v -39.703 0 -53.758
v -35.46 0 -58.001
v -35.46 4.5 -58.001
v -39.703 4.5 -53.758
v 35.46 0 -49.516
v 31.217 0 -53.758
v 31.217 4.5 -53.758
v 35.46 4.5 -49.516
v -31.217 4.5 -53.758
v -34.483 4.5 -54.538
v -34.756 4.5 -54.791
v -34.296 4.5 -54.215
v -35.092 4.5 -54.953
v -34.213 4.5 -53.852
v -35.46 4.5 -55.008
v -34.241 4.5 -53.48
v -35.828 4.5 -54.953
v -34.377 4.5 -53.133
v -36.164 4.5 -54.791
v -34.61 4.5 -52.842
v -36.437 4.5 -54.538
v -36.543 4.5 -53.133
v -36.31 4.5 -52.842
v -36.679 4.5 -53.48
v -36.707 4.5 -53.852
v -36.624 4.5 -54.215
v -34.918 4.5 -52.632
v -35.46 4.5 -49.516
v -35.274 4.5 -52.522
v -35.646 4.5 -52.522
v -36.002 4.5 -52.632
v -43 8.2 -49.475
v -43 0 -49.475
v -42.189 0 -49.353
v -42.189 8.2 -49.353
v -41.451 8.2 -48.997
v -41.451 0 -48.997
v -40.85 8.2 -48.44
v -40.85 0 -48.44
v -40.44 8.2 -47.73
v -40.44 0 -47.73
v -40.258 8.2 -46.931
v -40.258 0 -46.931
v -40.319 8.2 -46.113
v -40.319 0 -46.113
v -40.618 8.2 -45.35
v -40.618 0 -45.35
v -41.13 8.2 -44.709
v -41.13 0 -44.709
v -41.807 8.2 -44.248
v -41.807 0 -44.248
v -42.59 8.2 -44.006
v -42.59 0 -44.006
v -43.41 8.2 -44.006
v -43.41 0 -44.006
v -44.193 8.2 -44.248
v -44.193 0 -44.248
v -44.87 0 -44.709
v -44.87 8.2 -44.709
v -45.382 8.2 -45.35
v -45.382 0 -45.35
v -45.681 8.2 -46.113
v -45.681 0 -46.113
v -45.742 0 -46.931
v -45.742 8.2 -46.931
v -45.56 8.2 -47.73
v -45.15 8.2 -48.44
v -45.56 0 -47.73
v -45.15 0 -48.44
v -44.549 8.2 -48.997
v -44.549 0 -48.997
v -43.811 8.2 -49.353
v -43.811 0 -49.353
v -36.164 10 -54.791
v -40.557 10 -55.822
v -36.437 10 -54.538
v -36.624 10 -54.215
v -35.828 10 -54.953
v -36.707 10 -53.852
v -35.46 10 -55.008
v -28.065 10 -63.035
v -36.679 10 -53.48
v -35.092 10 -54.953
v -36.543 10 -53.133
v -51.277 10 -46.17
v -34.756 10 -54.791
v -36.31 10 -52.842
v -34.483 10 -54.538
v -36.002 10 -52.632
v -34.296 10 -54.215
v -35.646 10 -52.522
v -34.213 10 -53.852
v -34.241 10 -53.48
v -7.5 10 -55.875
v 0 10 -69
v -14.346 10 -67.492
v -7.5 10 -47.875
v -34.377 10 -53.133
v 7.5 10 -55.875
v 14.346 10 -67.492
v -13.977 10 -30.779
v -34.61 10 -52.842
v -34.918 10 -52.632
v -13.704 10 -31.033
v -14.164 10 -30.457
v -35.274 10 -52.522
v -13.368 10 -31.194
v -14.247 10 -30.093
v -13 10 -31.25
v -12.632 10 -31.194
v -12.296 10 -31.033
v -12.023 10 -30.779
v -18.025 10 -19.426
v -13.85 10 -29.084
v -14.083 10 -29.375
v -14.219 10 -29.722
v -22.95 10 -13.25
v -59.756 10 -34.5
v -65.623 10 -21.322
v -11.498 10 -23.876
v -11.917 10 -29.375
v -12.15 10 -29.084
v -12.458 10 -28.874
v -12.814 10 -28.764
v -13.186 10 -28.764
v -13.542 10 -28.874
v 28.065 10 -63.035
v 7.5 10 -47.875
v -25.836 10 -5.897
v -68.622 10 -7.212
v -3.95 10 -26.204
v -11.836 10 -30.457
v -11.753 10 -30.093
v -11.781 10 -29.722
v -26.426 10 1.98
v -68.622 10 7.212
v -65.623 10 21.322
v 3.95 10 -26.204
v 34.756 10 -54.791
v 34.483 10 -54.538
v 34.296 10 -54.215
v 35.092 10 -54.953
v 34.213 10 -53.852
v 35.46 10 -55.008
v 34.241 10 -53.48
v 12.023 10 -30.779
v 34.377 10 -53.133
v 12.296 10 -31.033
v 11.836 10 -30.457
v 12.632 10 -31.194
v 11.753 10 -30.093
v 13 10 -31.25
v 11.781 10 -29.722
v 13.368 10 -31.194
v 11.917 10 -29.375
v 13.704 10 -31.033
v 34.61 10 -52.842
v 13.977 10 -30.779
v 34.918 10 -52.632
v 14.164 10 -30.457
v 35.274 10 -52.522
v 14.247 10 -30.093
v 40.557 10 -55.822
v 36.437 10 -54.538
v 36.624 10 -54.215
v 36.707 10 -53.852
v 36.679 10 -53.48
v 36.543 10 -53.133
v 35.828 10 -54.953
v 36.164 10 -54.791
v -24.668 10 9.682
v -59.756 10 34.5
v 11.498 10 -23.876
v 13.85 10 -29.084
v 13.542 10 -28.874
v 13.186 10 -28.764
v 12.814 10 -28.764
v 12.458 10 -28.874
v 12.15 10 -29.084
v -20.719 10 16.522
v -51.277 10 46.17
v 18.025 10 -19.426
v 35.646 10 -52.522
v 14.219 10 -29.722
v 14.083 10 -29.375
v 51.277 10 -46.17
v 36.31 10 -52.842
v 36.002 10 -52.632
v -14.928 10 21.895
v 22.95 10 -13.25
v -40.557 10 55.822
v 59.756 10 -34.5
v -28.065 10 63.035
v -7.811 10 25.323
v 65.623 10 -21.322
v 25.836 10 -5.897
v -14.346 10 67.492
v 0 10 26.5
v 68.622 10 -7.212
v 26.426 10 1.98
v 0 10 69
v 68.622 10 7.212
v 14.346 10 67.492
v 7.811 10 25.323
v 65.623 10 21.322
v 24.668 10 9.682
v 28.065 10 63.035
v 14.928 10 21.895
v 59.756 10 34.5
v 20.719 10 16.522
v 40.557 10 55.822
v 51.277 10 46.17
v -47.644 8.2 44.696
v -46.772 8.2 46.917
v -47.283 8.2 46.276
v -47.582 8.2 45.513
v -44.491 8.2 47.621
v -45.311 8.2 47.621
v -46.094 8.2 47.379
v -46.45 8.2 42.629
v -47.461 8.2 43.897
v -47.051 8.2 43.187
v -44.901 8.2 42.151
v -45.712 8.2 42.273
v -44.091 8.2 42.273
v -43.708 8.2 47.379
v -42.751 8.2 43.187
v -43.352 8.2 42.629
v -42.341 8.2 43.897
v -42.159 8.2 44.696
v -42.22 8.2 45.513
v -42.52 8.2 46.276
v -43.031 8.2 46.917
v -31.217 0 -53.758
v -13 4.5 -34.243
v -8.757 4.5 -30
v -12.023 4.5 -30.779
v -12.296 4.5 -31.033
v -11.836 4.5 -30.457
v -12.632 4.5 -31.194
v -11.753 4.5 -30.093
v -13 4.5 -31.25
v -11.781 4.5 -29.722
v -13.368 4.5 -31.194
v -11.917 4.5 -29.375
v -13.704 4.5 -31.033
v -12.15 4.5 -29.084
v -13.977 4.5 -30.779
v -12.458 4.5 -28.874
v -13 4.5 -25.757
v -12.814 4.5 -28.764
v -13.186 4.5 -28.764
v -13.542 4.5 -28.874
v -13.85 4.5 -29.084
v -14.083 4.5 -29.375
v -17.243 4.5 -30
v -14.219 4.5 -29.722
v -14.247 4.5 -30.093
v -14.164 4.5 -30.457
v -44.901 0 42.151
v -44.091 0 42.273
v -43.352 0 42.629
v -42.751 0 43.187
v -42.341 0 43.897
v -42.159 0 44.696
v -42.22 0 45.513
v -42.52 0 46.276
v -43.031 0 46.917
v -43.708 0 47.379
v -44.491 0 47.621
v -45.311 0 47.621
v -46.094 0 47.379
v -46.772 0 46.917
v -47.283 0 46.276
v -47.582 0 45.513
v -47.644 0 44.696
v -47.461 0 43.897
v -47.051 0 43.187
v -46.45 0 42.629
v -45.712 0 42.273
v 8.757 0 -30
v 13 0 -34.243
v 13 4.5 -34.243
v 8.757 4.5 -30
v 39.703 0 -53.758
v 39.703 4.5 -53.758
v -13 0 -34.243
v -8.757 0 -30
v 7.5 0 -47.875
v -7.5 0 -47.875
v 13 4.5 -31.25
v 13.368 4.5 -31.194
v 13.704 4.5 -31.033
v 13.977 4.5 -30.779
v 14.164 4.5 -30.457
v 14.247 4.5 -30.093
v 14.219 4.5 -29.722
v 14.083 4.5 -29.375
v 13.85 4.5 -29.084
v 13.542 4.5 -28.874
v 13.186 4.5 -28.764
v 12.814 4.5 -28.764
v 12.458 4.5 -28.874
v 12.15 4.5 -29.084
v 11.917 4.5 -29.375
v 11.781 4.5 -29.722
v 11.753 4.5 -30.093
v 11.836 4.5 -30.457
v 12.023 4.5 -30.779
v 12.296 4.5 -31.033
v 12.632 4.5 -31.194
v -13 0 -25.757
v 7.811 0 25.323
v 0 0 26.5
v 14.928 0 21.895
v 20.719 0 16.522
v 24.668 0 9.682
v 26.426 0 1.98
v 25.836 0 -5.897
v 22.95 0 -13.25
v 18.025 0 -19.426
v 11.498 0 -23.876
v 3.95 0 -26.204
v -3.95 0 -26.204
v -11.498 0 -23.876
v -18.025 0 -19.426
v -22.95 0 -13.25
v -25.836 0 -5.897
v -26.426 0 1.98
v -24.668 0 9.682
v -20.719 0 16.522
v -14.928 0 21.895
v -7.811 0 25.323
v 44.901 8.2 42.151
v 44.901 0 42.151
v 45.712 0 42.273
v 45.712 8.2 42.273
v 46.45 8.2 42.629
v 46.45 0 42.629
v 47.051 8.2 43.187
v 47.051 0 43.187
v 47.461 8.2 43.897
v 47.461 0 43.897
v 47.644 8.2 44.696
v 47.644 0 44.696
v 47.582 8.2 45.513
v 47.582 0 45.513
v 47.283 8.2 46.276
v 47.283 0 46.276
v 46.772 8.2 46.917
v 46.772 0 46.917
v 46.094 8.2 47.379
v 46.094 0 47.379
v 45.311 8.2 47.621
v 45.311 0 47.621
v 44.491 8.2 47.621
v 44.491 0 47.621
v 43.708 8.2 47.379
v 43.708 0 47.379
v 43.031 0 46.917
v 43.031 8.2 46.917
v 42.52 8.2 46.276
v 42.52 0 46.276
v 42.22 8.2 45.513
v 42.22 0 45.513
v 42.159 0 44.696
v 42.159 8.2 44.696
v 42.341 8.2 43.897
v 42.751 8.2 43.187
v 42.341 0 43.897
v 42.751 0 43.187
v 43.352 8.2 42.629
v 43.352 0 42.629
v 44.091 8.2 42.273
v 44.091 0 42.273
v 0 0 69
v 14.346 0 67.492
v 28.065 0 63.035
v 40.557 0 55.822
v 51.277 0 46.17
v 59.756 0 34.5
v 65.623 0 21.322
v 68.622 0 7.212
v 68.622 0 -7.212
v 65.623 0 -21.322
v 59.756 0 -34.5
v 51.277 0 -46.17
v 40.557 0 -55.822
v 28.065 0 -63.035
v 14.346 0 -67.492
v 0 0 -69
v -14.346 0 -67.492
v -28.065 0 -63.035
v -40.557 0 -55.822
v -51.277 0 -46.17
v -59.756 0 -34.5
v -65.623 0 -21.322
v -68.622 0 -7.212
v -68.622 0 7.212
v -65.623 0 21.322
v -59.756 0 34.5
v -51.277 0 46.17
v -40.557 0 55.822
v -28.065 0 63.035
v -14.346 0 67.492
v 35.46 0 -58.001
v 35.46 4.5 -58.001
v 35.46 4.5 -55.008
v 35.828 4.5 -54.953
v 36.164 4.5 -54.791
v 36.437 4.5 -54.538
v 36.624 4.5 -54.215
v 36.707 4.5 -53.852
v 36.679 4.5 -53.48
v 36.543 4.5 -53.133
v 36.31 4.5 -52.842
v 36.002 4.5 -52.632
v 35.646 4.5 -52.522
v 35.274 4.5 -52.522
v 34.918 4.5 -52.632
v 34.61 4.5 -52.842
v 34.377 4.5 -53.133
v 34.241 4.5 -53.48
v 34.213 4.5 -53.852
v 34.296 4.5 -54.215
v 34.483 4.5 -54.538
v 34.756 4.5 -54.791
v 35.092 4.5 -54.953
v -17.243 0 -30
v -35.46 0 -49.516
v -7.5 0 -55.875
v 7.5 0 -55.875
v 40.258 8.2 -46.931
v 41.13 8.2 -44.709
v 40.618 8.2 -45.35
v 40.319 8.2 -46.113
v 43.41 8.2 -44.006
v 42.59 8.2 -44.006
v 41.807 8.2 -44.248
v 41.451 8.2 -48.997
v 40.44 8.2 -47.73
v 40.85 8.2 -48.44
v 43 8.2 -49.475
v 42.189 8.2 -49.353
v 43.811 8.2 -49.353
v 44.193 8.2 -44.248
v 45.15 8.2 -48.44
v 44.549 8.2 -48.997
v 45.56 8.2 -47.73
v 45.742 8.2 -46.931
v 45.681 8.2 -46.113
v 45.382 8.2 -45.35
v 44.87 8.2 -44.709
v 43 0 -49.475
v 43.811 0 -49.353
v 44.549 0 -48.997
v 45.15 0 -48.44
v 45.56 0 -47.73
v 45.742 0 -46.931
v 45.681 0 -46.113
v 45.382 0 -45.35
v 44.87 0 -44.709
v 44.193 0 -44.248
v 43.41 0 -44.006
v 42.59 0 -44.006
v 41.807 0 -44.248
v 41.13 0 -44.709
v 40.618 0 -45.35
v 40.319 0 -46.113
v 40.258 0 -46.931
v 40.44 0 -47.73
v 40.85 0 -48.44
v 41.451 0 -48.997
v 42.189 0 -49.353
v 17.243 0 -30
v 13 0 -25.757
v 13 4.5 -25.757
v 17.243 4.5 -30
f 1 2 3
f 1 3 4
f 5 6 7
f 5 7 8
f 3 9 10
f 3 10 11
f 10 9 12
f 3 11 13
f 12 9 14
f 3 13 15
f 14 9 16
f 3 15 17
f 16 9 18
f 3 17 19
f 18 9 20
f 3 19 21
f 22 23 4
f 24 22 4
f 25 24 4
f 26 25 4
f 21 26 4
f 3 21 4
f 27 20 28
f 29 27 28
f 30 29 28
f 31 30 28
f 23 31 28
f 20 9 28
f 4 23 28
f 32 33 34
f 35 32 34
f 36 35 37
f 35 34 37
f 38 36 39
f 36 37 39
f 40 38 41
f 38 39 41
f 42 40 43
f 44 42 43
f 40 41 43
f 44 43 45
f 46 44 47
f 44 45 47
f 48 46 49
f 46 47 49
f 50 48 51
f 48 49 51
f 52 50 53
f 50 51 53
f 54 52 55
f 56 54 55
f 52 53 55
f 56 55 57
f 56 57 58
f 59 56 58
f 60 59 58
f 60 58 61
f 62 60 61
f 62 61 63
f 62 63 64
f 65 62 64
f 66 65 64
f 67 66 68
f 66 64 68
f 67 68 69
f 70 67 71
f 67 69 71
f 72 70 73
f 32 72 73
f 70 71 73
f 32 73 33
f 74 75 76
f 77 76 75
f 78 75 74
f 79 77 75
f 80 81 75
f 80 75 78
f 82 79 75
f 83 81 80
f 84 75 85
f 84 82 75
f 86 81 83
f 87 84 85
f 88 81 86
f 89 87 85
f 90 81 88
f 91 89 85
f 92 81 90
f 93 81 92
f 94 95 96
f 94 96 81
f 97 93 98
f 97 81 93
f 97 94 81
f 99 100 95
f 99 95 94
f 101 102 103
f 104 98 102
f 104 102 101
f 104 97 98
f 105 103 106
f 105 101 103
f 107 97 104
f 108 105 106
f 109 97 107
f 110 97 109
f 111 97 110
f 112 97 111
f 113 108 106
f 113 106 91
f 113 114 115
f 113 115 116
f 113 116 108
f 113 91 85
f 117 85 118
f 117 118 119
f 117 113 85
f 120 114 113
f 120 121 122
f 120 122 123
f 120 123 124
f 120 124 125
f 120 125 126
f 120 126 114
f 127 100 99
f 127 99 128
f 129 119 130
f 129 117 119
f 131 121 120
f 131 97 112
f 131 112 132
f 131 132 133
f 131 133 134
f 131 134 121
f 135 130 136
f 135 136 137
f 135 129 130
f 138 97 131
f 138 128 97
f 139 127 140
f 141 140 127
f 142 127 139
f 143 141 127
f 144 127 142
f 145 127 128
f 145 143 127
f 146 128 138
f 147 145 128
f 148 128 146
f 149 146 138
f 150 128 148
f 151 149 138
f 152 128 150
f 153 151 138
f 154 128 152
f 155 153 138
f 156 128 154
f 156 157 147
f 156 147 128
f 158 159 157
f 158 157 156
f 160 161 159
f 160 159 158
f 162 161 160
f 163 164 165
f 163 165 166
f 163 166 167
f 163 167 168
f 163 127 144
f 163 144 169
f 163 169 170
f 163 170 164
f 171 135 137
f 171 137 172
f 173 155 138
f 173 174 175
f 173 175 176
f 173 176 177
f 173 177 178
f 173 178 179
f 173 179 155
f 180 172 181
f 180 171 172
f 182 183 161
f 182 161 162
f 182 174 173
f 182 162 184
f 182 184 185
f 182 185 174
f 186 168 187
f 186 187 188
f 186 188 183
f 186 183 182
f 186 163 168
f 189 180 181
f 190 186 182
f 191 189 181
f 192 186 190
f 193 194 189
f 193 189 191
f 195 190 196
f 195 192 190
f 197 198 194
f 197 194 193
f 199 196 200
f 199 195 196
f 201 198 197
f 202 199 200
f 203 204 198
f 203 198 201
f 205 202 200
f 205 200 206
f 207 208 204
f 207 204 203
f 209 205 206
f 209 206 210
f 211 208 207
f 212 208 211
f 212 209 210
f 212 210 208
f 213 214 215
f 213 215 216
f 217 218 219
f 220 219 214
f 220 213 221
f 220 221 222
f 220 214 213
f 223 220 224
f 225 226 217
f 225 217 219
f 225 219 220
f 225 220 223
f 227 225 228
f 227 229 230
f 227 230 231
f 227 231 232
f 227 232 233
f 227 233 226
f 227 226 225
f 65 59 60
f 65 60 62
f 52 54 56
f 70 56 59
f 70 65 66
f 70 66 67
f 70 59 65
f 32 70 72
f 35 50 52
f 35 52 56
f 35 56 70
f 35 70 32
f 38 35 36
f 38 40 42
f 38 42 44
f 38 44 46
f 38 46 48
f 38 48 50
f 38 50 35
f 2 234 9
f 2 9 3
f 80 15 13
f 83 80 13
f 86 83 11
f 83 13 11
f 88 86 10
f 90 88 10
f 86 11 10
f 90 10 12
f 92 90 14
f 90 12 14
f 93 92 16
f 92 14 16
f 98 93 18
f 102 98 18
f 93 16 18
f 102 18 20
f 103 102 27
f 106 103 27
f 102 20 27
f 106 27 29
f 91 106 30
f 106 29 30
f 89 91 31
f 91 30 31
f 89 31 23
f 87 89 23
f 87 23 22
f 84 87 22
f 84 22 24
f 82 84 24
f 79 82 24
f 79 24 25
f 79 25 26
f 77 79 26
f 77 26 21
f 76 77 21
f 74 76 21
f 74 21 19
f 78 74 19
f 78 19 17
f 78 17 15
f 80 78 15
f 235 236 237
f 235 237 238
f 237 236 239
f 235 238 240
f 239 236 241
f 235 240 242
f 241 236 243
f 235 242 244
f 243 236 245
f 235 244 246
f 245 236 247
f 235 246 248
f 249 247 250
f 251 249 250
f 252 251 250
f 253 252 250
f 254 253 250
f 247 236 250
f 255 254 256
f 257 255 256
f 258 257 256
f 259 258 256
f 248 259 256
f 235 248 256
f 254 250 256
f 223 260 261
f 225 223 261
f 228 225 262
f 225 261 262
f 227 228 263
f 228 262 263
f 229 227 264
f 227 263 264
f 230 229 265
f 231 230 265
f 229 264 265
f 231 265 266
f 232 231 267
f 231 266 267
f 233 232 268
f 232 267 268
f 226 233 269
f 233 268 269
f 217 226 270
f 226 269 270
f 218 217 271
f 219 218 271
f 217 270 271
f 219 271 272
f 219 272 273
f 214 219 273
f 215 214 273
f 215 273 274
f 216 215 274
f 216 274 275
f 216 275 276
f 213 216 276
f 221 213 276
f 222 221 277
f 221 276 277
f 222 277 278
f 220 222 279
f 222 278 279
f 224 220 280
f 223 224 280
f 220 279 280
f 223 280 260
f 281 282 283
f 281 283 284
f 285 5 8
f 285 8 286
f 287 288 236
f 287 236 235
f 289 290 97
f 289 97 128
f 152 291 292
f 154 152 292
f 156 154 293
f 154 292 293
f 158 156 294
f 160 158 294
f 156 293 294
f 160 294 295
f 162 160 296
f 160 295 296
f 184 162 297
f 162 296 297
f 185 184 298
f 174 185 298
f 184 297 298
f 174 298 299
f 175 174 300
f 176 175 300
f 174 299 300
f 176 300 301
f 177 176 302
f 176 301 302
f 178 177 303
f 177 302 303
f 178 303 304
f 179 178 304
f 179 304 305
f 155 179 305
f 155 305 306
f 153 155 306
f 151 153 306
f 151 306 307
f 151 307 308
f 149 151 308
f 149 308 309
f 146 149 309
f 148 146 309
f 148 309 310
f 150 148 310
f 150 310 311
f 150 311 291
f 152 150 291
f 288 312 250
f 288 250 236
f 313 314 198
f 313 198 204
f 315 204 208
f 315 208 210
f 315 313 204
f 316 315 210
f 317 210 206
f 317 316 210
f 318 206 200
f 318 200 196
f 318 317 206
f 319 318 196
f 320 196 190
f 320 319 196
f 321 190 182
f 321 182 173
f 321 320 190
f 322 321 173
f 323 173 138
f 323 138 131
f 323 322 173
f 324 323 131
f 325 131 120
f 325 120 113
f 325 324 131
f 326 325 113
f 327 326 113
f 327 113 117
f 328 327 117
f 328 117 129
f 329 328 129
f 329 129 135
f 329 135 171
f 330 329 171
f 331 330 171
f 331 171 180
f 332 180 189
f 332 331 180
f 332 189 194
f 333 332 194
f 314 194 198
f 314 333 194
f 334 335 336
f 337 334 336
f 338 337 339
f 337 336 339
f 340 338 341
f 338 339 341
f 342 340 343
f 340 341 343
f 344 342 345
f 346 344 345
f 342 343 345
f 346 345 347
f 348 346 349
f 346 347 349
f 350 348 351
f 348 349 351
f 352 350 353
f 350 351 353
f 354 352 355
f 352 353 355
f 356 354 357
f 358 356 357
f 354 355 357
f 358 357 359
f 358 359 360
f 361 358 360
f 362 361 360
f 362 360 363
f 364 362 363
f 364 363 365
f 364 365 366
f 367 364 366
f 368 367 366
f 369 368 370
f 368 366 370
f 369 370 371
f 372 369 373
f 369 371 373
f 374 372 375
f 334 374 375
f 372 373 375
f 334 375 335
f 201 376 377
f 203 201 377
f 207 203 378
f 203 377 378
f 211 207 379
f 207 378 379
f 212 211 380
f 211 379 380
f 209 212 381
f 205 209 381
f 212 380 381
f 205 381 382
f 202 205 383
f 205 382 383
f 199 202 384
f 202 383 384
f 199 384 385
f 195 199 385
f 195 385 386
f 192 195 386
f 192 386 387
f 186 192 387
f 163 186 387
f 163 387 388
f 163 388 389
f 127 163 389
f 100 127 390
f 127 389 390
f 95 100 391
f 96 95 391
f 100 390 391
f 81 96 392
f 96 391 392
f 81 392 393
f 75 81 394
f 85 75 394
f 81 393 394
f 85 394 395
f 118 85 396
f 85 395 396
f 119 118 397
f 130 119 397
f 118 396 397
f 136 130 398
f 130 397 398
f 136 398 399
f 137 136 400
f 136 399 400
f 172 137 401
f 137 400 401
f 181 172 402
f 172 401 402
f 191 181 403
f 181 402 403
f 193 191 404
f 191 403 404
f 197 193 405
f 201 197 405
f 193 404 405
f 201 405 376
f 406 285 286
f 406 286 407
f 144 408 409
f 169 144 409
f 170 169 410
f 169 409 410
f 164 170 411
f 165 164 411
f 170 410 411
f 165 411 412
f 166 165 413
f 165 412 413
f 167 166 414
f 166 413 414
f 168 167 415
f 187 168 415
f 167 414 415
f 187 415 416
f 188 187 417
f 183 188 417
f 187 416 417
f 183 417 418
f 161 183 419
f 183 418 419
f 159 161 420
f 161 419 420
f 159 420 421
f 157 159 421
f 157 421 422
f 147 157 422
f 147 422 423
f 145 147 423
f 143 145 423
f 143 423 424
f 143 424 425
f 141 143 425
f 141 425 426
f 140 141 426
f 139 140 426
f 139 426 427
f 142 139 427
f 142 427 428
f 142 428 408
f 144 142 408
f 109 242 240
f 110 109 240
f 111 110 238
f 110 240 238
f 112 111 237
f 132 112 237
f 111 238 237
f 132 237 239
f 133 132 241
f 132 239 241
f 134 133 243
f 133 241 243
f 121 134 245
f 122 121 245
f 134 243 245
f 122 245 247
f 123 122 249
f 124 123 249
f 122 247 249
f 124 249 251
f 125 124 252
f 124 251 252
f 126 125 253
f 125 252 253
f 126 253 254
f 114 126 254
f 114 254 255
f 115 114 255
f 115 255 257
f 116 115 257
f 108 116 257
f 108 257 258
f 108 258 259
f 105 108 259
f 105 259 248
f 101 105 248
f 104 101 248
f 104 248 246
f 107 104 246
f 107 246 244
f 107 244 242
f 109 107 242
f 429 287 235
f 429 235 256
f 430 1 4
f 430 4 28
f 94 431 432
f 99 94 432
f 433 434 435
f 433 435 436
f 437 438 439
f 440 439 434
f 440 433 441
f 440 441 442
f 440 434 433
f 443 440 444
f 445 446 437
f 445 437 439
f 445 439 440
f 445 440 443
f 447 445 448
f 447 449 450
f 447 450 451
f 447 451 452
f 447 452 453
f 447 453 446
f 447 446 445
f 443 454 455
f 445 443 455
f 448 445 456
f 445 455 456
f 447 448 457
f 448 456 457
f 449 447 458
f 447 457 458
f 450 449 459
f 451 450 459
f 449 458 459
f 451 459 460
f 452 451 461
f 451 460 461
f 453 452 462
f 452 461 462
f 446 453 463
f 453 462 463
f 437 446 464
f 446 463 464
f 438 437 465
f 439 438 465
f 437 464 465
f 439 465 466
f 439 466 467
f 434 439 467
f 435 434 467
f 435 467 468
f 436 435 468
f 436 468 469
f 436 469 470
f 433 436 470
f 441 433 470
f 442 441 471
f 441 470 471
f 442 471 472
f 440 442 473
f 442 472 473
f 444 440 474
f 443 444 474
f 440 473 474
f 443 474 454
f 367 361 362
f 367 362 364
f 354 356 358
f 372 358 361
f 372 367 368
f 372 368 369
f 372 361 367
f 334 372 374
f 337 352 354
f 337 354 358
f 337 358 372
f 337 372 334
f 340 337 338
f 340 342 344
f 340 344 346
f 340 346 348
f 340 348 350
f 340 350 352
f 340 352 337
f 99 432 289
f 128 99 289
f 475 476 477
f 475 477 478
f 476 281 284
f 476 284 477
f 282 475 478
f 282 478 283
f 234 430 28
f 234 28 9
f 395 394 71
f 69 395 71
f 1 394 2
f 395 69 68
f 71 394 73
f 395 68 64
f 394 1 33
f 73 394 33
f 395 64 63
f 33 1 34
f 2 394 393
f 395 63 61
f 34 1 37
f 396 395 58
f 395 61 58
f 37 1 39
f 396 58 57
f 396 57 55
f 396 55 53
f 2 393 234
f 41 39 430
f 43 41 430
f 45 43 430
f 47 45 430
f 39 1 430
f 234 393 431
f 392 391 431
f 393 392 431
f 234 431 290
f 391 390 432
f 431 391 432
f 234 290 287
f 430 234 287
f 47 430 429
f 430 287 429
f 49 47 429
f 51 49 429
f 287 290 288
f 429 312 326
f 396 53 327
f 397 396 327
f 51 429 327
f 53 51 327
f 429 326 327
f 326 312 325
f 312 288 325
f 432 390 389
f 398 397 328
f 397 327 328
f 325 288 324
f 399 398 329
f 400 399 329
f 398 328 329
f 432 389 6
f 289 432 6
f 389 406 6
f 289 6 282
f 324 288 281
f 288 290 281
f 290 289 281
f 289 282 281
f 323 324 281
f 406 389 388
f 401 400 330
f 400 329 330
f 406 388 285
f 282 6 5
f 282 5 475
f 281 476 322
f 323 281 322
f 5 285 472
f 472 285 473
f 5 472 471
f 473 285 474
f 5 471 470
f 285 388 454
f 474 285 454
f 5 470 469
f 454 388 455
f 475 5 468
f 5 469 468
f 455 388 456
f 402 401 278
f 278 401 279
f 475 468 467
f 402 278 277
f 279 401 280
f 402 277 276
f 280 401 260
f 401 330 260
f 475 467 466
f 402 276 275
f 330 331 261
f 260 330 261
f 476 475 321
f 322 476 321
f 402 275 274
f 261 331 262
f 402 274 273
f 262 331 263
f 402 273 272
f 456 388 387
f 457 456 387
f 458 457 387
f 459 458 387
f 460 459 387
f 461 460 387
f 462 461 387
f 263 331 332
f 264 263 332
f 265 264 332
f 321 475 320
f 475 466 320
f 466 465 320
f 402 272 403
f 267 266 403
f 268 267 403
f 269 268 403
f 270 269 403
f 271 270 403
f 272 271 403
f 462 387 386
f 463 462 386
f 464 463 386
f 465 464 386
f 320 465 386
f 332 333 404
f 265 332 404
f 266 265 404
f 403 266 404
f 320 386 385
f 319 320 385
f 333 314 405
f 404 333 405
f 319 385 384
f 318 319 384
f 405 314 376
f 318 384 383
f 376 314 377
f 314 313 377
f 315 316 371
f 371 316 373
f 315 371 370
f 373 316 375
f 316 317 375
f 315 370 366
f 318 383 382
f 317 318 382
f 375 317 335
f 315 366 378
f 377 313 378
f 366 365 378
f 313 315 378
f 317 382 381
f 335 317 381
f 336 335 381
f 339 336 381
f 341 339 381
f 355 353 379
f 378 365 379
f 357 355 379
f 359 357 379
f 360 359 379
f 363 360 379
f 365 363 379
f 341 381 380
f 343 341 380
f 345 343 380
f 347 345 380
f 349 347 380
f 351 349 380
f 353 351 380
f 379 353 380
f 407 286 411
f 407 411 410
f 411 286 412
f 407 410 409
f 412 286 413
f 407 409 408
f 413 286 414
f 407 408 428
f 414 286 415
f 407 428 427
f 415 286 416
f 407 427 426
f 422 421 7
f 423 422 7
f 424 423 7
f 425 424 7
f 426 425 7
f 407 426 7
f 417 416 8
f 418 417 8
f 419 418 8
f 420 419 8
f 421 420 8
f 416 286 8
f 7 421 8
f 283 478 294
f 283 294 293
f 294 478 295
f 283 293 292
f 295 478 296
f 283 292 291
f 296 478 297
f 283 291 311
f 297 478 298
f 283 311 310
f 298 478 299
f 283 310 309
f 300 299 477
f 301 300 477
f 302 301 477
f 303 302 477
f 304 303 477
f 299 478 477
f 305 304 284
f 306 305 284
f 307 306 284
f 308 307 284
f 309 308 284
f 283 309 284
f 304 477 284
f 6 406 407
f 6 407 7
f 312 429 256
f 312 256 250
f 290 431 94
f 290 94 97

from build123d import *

# Parameters (mm, degrees)
SKETCH1_R           = 69
SKETCH1_R_2         = 26.5
BOSS_EXTRUDE1_DEPTH = 10
CUT_EXTRUDE1_DEPTH  = 4.5
SKETCH3_W           = 15
SKETCH3_H           = 8
CUT_EXTRUDE2_DEPTH  = 99.091793744
SKETCH4_R           = 1.25
CUT_EXTRUDE3_DEPTH  = 99.091793744
SKETCH5_R           = 2.75
CUT_EXTRUDE4_DEPTH  = 8.2


with BuildPart() as part:
    # Sketch1 → Boss-Extrude1 (new body)
    with BuildSketch(Plane(origin=(0, 0, 0), x_dir=(1, 0, 0), z_dir=(0, 1, 0))):
        with Locations(Location((0, 0, 0), (0, 0, 270))):
            Circle(SKETCH1_R)
        with Locations(Location((0, 0, 0), (0, 0, 270))):
            Circle(SKETCH1_R_2, mode=Mode.SUBTRACT)
    extrude(amount=BOSS_EXTRUDE1_DEPTH)

    # Sketch2 → Cut-Extrude1 (cut)
    with BuildSketch(Plane.XZ):
        Polygon((-13, -34.242640687), (-17.242640687, -30), (-13, -25.757359313), (-8.757359313, -30), align=None)
        Polygon((-35.46, -58.000880986), (-39.702640687, -53.758240299), (-35.46, -49.515599611), (-31.217359313, -53.758240299), align=None)
        Polygon((13, -34.242640687), (8.757359313, -30), (13, -25.757359313), (17.242640687, -30), align=None)
        Polygon((35.46, -58.000880986), (31.217359313, -53.758240299), (35.46, -49.515599611), (39.702640687, -53.758240299), align=None)
    extrude(amount=-CUT_EXTRUDE1_DEPTH, mode=Mode.SUBTRACT)

    # Sketch3 → Cut-Extrude2 (cut, through all)
    with BuildSketch(Plane.XZ):
        with Locations((0, -51.875)):
            Rectangle(SKETCH3_W, SKETCH3_H)
    extrude(amount=-CUT_EXTRUDE2_DEPTH, mode=Mode.SUBTRACT)

    # Sketch4 → Cut-Extrude3 (cut, through all)
    with BuildSketch(Plane.XZ):
        with Locations(Location((-13, -30, 0), (0, 0, 270))):
            Circle(SKETCH4_R)
        with Locations(Location((13, -30, 0), (0, 0, 270))):
            Circle(SKETCH4_R)
        with Locations(Location((-35.46, -53.758240299, 0), (0, 0, 270))):
            Circle(SKETCH4_R)
        with Locations(Location((35.46, -53.758240299, 0), (0, 0, 270))):
            Circle(SKETCH4_R)
    extrude(amount=-CUT_EXTRUDE3_DEPTH, mode=Mode.SUBTRACT)

    # Sketch5 → Cut-Extrude4 (cut)
    with BuildSketch(Plane.XZ):
        with Locations(Location((-44.901280605, 44.901280605, 0), (0, 0, 270))):
            Circle(SKETCH5_R)
        with Locations(Location((44.901280605, 44.901280605, 0), (0, 0, 270))):
            Circle(SKETCH5_R)
        with Locations(Location((-43, -46.725260834, 0), (0, 0, 270))):
            Circle(SKETCH5_R)
        with Locations(Location((43, -46.725260834, 0), (0, 0, 270))):
            Circle(SKETCH5_R)
    extrude(amount=-CUT_EXTRUDE4_DEPTH, mode=Mode.SUBTRACT)


solid = part.part
